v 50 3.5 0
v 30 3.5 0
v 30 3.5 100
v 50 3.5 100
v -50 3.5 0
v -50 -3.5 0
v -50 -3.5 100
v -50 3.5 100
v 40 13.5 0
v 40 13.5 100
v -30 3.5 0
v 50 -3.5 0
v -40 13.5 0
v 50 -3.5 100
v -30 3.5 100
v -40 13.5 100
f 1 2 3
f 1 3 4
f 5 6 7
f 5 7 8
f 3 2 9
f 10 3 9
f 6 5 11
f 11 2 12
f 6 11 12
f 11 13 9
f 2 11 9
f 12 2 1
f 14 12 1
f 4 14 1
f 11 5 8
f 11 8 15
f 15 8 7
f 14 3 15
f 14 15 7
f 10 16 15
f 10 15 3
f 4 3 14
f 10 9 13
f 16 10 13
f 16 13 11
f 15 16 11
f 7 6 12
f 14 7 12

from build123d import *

# Parameters (mm, degrees)
CROQUIS1_W              = 100
CROQUIS1_H              = 7
SALIENTE_EXTRUIR1_DEPTH = 100


with BuildPart() as part:
    # Croquis1 → Saliente-Extruir1 (new body)
    with BuildSketch(Plane.XY):
        Polygon((-40, 13.5), (-30, 3.5), (30, 3.5), (40, 13.5), align=None)
        Rectangle(CROQUIS1_W, CROQUIS1_H)
    extrude(amount=SALIENTE_EXTRUIR1_DEPTH)


solid = part.part
